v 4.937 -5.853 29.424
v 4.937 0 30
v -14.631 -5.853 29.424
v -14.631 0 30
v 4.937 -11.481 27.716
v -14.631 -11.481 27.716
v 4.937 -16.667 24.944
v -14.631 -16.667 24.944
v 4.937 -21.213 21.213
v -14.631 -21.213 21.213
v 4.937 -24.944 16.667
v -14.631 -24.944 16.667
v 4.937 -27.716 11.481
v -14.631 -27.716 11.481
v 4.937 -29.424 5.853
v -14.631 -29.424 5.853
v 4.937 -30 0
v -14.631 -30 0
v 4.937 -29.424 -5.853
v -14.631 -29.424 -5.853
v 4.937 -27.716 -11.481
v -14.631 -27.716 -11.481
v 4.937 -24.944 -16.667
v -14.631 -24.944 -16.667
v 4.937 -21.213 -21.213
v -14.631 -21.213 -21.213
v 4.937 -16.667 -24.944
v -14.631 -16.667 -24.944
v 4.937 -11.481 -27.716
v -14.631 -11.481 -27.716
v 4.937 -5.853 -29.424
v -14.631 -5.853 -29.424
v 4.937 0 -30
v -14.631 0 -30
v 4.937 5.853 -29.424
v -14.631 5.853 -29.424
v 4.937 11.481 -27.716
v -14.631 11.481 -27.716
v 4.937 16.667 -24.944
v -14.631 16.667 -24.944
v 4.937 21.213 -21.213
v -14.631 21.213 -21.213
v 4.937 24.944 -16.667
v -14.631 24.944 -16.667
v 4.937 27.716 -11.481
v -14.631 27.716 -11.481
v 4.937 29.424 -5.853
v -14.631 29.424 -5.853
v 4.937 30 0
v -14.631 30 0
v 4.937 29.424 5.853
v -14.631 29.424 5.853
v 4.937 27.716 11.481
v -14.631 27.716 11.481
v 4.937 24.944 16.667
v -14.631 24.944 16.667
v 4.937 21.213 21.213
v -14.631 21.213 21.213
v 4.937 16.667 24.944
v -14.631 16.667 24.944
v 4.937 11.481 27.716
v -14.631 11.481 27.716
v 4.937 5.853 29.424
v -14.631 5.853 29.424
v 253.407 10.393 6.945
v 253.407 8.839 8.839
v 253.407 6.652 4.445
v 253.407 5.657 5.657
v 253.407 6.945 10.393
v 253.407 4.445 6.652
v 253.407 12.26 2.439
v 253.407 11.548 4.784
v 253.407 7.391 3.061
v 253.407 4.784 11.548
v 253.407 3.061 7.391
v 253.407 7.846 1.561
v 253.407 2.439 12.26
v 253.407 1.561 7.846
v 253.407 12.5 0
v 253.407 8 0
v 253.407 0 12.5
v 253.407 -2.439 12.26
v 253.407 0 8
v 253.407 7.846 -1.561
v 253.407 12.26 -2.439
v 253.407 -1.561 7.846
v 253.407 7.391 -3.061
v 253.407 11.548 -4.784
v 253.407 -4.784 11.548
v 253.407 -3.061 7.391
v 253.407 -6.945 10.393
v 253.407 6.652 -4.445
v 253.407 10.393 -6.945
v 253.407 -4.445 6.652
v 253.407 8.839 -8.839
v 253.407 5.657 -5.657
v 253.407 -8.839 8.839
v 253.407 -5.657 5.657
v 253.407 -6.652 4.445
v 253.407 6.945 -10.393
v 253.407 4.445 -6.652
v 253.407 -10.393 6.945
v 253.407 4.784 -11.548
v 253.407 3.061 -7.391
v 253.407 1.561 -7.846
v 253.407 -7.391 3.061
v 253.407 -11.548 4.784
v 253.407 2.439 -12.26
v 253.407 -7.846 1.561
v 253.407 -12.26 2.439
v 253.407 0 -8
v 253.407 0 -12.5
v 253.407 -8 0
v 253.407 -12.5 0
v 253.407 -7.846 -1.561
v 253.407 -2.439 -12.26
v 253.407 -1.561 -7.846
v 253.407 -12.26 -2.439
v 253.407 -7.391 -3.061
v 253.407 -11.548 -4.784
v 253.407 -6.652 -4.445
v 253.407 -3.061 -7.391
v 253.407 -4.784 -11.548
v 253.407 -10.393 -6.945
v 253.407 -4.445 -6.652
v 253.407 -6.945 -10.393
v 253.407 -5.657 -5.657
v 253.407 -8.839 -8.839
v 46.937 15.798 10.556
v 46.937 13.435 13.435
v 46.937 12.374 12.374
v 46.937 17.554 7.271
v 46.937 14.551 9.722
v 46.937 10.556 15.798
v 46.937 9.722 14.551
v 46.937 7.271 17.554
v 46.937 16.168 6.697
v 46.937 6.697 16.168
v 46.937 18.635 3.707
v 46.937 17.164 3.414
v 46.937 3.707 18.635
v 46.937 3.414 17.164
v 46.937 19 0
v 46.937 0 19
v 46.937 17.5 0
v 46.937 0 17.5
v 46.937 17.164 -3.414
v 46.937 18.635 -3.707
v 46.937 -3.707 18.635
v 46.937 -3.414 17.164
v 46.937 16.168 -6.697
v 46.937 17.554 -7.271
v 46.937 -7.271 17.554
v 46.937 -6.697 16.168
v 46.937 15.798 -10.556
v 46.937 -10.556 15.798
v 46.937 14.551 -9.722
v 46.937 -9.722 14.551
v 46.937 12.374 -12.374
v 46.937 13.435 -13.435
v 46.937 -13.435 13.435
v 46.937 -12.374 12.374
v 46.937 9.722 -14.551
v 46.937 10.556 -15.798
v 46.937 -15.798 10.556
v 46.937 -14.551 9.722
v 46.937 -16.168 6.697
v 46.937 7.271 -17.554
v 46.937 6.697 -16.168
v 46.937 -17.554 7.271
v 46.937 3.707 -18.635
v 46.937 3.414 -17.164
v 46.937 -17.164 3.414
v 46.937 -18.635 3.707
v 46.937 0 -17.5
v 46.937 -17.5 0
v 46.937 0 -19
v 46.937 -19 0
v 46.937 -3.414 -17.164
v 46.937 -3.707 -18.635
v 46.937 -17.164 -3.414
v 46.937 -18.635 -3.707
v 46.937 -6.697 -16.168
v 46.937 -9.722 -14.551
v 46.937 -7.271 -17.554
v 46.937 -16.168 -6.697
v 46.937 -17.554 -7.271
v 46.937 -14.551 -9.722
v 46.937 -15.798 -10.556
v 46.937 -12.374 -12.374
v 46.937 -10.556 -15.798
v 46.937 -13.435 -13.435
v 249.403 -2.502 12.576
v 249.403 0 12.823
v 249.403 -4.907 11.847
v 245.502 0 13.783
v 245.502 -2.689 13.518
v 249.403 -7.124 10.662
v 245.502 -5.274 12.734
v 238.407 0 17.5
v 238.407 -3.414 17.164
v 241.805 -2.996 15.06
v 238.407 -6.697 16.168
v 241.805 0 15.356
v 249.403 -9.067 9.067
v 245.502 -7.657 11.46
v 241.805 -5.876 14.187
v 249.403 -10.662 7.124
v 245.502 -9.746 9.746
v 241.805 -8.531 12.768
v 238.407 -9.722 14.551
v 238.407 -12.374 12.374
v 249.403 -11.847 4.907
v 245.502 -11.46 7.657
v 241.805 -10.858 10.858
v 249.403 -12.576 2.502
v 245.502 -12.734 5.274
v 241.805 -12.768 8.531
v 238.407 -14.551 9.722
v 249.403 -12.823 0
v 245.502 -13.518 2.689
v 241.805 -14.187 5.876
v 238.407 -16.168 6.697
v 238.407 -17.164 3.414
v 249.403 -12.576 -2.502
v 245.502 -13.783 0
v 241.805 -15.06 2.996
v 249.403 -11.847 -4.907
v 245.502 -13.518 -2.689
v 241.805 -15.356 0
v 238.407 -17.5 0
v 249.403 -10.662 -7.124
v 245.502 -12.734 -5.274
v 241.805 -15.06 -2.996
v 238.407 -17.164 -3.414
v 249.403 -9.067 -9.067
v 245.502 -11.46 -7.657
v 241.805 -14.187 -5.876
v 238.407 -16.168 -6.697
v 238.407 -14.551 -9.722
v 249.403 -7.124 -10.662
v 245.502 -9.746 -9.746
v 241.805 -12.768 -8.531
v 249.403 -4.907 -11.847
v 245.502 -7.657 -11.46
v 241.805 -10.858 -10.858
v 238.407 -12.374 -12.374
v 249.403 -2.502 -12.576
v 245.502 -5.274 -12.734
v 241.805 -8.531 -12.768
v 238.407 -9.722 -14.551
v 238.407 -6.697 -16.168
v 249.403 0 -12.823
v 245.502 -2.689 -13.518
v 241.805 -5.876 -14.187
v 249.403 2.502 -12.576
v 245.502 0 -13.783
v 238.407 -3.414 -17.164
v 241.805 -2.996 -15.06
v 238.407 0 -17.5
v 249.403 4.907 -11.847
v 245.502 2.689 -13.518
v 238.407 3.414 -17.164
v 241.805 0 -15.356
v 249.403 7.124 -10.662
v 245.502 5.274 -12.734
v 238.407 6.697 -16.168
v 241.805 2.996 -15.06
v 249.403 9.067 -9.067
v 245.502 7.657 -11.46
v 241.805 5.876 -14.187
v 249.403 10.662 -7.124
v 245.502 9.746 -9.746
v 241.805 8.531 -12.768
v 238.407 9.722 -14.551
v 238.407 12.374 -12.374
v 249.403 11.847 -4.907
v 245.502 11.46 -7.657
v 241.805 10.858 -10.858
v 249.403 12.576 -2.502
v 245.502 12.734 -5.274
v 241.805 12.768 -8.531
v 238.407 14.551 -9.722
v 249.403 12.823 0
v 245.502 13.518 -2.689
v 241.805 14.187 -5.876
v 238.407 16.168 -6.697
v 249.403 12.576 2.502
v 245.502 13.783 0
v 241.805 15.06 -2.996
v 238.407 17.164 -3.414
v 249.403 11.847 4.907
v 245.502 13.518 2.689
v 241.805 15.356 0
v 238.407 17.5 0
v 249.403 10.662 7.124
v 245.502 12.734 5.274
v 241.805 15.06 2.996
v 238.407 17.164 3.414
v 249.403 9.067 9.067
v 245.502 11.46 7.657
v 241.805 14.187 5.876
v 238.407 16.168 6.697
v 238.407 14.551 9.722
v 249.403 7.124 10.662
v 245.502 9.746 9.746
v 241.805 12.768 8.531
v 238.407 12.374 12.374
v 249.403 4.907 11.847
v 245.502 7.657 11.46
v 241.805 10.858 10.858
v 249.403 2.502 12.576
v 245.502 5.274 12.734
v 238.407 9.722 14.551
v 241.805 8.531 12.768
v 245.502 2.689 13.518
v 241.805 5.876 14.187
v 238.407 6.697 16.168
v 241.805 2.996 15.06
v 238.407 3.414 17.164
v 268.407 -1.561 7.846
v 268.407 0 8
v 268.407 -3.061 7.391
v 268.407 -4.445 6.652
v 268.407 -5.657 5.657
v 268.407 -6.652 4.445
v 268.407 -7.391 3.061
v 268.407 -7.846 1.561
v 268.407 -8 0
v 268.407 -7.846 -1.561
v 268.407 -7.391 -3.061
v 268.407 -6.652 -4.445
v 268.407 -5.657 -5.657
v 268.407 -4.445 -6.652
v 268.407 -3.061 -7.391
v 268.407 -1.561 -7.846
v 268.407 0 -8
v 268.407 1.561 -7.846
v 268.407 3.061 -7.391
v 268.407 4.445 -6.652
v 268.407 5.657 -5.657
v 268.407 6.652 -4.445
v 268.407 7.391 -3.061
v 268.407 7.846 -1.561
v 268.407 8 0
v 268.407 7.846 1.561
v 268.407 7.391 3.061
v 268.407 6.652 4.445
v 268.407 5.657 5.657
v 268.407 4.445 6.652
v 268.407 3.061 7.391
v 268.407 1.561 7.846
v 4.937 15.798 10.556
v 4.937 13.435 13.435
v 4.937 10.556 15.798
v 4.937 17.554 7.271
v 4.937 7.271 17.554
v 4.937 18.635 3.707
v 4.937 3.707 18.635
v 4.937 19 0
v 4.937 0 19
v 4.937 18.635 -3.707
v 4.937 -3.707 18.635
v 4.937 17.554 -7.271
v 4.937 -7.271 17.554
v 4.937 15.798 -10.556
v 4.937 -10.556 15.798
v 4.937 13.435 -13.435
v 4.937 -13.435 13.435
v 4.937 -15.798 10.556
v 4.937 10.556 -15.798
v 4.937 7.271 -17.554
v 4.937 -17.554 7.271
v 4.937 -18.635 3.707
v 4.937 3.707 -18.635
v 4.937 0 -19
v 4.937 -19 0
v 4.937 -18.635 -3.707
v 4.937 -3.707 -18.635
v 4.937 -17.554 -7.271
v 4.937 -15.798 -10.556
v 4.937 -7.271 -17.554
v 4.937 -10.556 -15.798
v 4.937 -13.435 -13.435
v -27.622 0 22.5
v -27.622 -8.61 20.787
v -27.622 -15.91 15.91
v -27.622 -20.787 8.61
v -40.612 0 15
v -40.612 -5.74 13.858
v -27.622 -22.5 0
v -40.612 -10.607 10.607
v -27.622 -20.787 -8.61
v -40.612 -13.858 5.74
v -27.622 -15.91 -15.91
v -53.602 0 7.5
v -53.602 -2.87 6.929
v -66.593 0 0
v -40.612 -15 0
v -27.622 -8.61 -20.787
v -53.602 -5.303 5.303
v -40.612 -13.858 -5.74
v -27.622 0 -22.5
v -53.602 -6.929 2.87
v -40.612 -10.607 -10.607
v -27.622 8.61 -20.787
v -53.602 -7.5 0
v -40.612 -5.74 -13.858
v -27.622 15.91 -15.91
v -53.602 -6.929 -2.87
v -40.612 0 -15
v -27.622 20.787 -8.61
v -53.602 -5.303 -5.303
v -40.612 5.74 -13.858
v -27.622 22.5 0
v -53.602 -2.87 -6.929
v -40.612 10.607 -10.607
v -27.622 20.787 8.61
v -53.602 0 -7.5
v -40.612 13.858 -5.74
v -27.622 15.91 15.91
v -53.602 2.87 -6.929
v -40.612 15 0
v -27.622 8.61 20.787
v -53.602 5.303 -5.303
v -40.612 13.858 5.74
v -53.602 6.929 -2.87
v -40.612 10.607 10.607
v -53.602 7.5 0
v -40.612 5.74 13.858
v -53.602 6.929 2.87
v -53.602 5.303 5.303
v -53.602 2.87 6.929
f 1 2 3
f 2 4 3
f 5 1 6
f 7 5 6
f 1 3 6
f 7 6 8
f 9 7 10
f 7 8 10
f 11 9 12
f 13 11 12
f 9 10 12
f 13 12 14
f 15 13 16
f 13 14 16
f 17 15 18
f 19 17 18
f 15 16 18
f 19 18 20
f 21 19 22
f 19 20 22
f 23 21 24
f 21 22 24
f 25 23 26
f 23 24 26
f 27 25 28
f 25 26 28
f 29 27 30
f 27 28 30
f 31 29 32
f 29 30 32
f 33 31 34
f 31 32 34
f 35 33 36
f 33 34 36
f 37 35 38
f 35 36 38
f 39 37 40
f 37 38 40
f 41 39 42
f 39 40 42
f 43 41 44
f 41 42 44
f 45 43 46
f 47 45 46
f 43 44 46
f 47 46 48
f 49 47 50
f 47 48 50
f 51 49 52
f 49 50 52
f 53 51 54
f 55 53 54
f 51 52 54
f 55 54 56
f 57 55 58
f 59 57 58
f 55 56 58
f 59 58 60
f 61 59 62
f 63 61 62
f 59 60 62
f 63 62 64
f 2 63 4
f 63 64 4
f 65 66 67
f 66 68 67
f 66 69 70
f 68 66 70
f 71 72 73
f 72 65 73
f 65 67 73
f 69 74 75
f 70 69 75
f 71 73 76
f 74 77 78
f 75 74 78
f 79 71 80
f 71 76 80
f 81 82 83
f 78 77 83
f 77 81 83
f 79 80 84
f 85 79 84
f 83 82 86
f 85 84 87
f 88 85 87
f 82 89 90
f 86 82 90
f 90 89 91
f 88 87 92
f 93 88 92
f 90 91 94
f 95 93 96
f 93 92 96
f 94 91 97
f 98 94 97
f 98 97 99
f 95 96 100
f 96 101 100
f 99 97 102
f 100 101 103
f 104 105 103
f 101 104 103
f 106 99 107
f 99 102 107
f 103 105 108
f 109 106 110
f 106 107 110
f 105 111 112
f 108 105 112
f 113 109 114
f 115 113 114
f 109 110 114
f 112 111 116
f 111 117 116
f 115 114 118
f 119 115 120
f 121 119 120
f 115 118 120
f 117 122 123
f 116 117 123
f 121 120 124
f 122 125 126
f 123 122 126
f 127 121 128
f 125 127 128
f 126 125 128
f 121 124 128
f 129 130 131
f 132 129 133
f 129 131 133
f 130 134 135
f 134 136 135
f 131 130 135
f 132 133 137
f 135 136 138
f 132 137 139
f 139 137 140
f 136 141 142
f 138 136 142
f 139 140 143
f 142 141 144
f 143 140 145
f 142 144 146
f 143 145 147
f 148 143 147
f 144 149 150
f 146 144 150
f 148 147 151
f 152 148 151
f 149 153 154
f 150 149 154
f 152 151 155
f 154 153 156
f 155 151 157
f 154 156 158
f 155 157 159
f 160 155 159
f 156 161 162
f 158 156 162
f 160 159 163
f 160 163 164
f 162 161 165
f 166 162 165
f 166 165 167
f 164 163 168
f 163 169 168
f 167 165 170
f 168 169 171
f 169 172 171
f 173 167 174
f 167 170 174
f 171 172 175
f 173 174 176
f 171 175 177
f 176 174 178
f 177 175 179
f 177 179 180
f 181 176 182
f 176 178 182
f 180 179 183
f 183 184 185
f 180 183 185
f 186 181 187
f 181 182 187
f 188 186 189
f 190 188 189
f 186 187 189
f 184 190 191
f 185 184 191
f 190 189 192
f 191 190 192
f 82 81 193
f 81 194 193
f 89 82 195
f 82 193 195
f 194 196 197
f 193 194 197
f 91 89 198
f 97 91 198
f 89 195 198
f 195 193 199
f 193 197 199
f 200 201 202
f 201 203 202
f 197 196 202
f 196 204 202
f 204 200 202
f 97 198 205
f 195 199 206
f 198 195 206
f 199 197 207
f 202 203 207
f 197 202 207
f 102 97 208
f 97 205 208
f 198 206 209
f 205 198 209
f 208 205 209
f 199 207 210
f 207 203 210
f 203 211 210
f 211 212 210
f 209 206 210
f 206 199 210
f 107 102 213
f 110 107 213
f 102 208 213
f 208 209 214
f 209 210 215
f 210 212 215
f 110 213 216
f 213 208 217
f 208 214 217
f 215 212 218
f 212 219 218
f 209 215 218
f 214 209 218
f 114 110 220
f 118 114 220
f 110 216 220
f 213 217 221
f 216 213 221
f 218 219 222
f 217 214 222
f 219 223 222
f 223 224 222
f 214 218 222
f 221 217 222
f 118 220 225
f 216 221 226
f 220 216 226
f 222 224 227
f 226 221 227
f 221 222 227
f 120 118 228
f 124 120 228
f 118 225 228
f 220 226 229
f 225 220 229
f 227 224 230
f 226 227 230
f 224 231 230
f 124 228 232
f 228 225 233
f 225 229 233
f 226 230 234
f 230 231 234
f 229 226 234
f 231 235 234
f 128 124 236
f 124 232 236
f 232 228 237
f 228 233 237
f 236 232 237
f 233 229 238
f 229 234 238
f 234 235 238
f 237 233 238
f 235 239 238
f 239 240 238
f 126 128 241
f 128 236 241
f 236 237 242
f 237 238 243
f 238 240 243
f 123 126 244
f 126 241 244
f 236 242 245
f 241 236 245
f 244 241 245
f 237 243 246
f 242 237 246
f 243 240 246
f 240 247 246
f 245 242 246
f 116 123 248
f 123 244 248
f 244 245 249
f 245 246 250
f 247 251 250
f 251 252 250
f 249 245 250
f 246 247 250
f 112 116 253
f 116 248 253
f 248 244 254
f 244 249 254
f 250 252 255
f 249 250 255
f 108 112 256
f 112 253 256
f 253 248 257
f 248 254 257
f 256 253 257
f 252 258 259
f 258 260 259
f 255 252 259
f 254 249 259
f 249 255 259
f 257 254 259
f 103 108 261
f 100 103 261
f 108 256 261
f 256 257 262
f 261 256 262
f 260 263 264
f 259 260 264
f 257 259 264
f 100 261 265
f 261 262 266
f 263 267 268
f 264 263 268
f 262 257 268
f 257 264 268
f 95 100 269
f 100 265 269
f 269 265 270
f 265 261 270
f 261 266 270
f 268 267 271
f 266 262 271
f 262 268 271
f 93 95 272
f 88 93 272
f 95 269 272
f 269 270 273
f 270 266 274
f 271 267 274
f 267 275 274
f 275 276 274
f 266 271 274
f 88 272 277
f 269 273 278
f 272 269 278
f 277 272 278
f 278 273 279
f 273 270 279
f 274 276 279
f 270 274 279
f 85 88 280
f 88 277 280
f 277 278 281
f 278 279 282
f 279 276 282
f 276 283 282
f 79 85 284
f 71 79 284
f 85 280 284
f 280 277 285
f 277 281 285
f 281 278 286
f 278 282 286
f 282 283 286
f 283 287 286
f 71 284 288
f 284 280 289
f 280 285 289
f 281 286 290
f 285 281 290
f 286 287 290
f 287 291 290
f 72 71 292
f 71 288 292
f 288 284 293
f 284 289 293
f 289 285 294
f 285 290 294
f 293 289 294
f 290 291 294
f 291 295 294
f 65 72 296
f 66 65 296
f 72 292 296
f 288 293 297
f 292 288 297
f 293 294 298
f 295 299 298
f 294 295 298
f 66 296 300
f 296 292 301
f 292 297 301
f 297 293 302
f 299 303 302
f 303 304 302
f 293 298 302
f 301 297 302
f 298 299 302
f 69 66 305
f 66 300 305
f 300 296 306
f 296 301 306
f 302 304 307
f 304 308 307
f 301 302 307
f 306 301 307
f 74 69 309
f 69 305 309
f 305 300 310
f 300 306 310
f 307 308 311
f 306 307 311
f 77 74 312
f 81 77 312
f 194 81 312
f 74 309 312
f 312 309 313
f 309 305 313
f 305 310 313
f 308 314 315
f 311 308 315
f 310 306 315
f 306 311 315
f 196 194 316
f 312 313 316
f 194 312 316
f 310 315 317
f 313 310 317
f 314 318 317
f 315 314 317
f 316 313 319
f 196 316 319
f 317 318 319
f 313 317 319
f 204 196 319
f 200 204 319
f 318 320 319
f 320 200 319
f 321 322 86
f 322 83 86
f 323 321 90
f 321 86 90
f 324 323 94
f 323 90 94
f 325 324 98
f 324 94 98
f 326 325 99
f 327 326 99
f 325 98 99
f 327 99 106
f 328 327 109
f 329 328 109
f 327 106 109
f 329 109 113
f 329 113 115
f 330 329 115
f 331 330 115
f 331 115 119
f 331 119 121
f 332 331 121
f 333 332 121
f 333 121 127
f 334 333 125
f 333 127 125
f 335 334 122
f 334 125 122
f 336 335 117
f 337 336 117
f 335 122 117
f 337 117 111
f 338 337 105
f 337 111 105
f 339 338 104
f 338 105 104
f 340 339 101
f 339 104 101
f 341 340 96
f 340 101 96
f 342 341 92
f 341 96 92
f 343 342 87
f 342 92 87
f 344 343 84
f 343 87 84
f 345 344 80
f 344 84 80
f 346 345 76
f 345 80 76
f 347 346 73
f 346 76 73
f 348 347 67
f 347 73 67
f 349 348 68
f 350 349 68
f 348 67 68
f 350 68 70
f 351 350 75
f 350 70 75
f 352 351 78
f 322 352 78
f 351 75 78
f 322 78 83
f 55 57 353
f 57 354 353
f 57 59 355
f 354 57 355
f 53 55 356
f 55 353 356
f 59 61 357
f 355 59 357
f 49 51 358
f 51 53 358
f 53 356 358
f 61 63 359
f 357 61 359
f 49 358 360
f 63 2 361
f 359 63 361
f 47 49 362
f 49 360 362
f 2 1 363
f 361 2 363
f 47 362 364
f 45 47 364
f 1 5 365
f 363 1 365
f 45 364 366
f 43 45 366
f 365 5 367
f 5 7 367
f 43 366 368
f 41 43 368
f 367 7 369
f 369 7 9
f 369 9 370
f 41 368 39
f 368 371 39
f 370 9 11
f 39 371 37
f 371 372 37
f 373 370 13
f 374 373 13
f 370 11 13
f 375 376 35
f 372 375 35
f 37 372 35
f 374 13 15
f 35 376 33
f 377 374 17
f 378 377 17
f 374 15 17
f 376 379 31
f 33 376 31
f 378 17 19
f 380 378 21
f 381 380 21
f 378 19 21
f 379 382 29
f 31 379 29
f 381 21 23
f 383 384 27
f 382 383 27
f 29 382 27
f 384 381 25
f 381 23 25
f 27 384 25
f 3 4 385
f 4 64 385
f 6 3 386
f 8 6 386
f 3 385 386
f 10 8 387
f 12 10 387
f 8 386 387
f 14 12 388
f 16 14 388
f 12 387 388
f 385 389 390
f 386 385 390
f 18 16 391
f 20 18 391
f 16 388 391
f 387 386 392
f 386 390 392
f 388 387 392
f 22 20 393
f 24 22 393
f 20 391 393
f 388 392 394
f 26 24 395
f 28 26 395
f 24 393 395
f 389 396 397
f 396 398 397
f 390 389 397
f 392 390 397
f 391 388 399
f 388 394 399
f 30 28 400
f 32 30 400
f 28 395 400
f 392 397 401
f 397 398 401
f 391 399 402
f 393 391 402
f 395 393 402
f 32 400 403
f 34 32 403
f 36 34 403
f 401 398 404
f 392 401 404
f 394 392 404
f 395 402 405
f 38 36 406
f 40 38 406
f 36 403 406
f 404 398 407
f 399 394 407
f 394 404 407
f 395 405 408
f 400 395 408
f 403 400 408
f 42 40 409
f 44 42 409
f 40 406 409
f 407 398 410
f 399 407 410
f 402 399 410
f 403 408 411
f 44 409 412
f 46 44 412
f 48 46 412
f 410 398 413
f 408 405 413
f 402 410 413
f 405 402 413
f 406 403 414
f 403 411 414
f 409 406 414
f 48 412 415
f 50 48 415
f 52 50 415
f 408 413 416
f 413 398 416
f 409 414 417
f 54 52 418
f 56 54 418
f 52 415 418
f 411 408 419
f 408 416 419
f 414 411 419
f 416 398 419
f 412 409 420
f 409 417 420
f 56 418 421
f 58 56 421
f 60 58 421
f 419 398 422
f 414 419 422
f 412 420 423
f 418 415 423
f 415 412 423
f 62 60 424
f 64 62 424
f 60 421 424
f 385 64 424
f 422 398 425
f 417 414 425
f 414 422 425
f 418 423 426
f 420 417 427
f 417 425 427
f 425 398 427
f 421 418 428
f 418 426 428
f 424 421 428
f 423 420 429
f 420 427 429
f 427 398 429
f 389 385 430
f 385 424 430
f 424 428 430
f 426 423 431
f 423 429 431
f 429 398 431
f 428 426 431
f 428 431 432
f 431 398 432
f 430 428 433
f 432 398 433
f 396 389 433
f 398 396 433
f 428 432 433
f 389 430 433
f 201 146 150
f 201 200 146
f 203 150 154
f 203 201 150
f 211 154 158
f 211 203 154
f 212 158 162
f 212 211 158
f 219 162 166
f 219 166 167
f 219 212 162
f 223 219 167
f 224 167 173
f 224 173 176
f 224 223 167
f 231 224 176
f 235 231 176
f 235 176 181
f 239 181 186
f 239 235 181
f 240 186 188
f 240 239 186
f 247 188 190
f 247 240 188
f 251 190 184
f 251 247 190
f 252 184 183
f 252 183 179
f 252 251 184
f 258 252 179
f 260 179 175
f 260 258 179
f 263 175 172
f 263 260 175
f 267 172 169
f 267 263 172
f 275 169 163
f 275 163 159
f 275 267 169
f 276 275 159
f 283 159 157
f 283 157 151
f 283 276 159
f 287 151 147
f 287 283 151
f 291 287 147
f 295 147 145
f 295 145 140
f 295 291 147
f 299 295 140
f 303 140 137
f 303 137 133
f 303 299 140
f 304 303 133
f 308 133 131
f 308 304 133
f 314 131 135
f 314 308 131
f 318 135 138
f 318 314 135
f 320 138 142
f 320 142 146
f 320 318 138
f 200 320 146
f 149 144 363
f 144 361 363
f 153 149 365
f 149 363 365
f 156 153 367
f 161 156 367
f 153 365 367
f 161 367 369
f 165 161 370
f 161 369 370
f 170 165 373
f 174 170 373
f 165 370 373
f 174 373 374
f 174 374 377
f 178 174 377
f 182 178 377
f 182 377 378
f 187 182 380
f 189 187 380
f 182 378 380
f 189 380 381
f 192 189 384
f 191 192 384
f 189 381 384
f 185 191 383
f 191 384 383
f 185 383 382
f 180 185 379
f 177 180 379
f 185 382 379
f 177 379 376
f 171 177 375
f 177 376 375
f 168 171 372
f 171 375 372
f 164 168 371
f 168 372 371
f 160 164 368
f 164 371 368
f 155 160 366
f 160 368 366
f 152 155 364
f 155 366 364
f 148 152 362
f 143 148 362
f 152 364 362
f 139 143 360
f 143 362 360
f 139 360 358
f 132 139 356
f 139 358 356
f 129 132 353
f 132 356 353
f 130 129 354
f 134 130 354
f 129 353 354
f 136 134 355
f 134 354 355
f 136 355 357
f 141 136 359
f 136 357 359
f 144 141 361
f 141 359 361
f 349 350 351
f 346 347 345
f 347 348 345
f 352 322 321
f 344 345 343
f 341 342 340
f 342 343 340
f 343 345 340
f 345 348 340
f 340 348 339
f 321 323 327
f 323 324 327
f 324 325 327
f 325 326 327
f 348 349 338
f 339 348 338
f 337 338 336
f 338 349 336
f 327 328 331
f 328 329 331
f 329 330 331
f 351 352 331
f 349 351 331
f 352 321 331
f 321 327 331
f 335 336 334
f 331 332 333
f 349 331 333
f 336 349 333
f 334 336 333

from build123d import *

# Parameters (mm, degrees)
SKETCH1_W = 191.470180192
SKETCH1_H = 17.5


with BuildPart() as part:
    # Sketch1 → Revolve4 (revolve)
    with BuildSketch(Plane.XY, mode=Mode.PRIVATE) as revolve4_sk:
        Polygon((-14.631119083, 30), (-66.59264331, 0), (-14.631119083, 0), align=None)
        Polygon((4.937176498, 30), (-14.631119083, 30), (-14.631119083, 0), (4.937176498, 0), (4.937176498, 19), align=None)
        Polygon((4.937176498, 19), (4.937176498, 0), (46.937176498, 0), (46.937176498, 17.5), (46.937176498, 19), align=None)
        with Locations((142.672266594, 8.75)):
            Rectangle(SKETCH1_W, SKETCH1_H)
        with BuildLine():
            Line((238.40735669, 17.5), (238.40735669, 0))
            Line((238.40735669, 0), (268.40735669, 0))
            Line((268.40735669, 0), (268.40735669, 8))
            Line((268.40735669, 8), (253.40735669, 8))
            Line((253.40735669, 8), (253.40735669, 12.5))
            ThreePointArc((253.40735669, 12.5), (245.501662539, 13.782917549), (238.40735669, 17.5))
        make_face()
    revolve(revolve4_sk.sketch.rotate(Axis((-83.378075763, 0, 0), (1, 0, 0)), 90), axis=Axis((-83.378075763, 0, 0), (1, 0, 0)))


solid = part.part
